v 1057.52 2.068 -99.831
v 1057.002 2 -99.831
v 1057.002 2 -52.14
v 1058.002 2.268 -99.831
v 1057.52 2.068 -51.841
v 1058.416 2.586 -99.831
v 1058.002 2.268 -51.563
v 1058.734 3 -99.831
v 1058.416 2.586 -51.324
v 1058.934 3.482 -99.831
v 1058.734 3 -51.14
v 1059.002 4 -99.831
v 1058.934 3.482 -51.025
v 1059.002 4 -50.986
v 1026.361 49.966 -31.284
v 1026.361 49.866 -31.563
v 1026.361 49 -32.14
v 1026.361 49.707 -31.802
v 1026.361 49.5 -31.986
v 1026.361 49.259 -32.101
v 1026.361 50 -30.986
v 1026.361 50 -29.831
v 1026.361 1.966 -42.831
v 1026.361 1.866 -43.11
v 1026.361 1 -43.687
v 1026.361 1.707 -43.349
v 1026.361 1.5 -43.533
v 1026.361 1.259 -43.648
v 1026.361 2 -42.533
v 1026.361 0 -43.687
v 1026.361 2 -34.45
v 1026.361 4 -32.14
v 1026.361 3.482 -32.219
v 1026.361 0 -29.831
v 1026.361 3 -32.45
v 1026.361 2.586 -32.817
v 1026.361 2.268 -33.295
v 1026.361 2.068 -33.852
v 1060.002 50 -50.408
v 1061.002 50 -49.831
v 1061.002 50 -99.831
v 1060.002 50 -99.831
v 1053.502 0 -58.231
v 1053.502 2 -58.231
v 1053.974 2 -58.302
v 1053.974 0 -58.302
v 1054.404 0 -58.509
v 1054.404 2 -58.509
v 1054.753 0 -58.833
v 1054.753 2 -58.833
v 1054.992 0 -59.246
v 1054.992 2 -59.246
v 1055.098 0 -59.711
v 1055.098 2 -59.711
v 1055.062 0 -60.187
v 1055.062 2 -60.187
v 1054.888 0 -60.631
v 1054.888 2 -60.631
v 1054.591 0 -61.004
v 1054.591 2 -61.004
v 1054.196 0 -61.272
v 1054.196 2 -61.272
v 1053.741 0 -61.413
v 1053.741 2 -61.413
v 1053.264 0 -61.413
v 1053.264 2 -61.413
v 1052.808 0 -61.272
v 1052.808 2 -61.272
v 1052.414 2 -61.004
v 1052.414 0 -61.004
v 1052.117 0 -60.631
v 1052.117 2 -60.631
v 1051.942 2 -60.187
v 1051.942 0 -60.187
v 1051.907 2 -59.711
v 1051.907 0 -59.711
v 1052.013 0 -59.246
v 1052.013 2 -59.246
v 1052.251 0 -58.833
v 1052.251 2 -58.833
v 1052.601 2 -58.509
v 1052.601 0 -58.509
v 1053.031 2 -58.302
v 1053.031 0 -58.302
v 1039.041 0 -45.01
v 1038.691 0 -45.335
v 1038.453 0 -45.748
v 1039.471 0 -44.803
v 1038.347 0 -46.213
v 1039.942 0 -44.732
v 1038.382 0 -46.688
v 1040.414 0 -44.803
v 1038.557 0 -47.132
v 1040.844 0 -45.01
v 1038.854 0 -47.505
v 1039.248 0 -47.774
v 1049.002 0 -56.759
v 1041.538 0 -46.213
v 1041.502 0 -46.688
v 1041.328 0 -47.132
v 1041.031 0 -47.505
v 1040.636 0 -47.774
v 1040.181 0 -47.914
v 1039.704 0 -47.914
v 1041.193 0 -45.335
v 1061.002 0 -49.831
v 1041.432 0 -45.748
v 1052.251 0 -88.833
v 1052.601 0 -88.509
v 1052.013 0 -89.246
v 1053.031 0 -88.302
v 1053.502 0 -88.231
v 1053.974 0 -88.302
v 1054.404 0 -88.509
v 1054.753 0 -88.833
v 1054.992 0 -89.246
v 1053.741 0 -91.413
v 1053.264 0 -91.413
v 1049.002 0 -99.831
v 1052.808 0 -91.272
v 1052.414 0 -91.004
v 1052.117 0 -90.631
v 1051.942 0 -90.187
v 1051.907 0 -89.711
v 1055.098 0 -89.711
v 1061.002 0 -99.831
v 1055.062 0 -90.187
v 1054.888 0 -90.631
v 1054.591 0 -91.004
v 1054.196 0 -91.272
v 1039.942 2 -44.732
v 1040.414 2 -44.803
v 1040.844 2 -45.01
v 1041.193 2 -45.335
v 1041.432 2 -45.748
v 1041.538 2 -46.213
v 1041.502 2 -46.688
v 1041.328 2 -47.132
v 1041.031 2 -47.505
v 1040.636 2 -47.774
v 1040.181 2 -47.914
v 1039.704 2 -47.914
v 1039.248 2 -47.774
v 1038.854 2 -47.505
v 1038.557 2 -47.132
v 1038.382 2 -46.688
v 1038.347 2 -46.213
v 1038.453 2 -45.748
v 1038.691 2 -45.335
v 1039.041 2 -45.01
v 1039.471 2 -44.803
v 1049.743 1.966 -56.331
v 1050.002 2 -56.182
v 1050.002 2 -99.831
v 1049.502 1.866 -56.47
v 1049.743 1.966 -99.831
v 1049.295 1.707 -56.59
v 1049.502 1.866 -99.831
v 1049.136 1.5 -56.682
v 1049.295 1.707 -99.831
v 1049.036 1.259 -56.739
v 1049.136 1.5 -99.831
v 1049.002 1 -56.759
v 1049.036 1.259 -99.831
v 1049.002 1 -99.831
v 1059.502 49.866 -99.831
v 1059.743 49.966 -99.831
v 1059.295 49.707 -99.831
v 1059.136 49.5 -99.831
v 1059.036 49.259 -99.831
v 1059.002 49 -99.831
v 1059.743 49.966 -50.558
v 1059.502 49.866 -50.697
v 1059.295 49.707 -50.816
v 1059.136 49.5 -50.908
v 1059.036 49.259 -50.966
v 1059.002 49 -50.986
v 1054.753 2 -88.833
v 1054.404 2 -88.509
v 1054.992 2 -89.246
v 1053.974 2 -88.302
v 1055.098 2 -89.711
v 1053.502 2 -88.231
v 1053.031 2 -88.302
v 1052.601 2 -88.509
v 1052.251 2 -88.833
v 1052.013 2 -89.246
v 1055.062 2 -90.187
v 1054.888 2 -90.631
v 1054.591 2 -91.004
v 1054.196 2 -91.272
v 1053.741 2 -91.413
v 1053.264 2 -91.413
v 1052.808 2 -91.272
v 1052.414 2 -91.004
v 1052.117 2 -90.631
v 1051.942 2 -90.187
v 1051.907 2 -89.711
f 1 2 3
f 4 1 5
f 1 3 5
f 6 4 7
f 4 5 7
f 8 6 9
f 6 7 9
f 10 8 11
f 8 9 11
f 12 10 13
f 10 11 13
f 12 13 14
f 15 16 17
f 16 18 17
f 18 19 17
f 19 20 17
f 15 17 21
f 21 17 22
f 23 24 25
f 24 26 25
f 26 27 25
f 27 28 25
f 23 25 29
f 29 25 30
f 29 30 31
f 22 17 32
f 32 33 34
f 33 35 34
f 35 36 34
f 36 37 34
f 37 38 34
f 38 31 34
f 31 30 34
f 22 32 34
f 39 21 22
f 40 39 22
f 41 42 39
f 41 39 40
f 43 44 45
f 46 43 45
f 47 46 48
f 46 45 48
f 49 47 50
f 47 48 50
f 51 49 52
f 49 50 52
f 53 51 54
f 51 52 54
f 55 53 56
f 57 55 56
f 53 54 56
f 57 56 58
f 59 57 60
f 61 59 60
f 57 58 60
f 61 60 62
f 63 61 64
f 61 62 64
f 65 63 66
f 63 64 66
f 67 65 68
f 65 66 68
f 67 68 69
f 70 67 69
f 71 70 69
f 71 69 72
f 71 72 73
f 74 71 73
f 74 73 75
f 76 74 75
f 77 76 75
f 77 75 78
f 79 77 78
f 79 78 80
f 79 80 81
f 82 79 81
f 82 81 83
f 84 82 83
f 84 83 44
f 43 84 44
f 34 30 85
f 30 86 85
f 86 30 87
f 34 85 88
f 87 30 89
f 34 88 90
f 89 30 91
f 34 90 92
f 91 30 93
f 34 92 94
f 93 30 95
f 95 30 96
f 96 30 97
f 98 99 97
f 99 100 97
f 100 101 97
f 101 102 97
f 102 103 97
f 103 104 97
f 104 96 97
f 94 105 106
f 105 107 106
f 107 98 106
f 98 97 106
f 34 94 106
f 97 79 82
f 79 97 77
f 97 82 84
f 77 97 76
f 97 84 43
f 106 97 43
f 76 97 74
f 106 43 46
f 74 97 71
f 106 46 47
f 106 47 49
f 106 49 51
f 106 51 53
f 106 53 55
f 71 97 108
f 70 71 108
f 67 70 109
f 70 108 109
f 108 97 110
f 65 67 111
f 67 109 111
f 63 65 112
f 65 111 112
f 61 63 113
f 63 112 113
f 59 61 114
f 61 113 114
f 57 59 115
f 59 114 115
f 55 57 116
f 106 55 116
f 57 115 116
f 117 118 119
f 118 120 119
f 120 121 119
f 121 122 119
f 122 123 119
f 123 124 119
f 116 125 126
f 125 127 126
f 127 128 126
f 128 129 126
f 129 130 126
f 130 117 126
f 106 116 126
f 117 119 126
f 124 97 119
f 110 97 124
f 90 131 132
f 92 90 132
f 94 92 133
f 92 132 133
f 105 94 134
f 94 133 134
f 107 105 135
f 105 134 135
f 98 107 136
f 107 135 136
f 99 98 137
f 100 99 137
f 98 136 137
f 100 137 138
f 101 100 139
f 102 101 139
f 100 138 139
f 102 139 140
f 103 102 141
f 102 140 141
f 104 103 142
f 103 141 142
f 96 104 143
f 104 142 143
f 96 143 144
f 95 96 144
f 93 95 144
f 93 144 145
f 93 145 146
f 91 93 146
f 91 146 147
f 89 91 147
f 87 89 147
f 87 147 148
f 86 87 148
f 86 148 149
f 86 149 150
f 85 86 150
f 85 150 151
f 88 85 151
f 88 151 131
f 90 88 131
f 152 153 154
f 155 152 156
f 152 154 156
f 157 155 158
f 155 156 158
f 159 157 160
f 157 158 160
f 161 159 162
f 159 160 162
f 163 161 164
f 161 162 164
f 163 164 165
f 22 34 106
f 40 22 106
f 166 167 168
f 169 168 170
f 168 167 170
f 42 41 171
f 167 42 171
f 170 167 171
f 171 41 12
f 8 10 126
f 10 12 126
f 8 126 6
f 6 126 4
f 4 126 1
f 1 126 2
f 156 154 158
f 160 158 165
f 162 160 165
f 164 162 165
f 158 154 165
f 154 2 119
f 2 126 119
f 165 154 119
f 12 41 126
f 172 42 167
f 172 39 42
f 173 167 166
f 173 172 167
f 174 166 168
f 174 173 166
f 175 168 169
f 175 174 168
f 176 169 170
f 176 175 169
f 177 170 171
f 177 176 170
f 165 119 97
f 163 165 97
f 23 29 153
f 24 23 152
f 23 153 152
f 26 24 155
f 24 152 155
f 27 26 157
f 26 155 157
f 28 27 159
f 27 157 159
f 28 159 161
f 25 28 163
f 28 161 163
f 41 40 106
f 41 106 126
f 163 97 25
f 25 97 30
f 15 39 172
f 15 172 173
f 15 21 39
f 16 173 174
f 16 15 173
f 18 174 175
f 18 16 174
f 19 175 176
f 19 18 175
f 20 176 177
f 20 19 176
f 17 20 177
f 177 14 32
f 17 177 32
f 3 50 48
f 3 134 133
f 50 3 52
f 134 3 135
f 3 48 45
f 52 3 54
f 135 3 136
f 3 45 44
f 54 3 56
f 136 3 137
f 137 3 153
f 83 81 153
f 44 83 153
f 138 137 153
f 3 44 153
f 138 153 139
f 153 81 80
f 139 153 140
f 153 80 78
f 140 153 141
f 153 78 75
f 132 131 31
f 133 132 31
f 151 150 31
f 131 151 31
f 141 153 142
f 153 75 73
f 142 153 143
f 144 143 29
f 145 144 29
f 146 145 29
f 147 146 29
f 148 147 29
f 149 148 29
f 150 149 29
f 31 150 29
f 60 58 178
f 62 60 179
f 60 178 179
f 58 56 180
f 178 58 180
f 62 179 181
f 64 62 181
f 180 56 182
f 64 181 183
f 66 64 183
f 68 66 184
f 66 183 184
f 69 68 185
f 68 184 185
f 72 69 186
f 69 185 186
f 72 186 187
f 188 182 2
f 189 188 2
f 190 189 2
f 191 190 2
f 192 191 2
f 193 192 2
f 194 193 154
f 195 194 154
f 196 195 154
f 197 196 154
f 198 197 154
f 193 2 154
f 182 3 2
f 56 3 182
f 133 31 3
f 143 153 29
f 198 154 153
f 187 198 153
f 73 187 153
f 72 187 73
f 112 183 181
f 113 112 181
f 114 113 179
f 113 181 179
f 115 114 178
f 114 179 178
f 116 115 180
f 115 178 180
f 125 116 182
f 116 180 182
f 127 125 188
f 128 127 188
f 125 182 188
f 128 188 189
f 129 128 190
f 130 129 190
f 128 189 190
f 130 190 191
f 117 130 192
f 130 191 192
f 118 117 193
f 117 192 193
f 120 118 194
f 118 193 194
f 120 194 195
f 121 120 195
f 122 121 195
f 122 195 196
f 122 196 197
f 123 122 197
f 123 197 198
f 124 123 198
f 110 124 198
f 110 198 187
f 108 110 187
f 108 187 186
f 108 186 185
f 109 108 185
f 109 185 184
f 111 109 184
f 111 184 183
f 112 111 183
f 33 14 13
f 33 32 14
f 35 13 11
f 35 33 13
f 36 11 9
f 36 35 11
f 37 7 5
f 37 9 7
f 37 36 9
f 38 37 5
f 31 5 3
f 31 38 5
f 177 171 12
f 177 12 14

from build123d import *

# Parameters (mm, degrees)
BOSS_EXTRUDE1_DEPTH = 50
CUT_EXTRUDE1_DEPTH  = 48
FILLET1_R           = 1
FILLET2_R           = 2
SKETCH3_R           = 1.6
CUT_EXTRUDE2_DEPTH  = 1067.768955656


with BuildPart() as part:
    # Sketch1 → Boss-Extrude1 (new body)
    with BuildSketch(Plane(origin=(0, 0, 0), x_dir=(1, 0, 0), z_dir=(0, 1, 0))):
        Polygon((1026.361248777, 29.83084978), (1061.002264928, 49.83084978), (1061.002264928, 99.83084978), (1049.002264928, 99.83084978), (1049.002264928, 56.75905301), (1026.361248777, 43.68725624), align=None)
    extrude(amount=BOSS_EXTRUDE1_DEPTH)

    # Sketch2 → Cut-Extrude1 (cut)
    with BuildSketch(Plane(origin=(0, 50, 0), x_dir=(1, 0, 0), z_dir=(0, 1, 0))):
        Polygon((1059.002264928, 99.83084978), (1059.002264928, 50.985550318), (1026.361248777, 32.140250857), (1013.240003321, 83.162287717), (1049.002264928, 102.282604927), align=None)
    extrude(amount=-CUT_EXTRUDE1_DEPTH, mode=Mode.SUBTRACT)

    # Fillet1
    fillet1_edges = [part.edges().sort_by_distance(p)[0] for p in [
        (1037.681756852, 2, -50.223154625),
        (1049.002264928, 2, -78.294951395),
        (1042.681756852, 50, -41.562900587),
        (1059.002264928, 50, -75.408200049),
    ]]
    fillet(fillet1_edges, radius=FILLET1_R)

    # Fillet2
    fillet2_edges = [part.edges().sort_by_distance(p)[0] for p in [
        (1059.002264928, 2, -75.408200049),
        (1042.681756852, 2, -41.562900587),
    ]]
    fillet(fillet2_edges, radius=FILLET2_R)

    # Sketch3 → Cut-Extrude2 (cut, through all)
    with BuildSketch(Plane(origin=(0, 2, 0), x_dir=(1, 0, 0), z_dir=(0, 1, 0))):
        with Locations(Location((1039.942264928, 46.332107148, 0), (0, 0, 270))):
            Circle(SKETCH3_R)
        with Locations(Location((1053.502264928, 59.83084978, 0), (0, 0, 270))):
            Circle(SKETCH3_R)
        with Locations(Location((1053.502264928, 89.83084978, 0), (0, 0, 270))):
            Circle(SKETCH3_R)
    extrude(amount=-CUT_EXTRUDE2_DEPTH, mode=Mode.SUBTRACT)


solid = part.part
